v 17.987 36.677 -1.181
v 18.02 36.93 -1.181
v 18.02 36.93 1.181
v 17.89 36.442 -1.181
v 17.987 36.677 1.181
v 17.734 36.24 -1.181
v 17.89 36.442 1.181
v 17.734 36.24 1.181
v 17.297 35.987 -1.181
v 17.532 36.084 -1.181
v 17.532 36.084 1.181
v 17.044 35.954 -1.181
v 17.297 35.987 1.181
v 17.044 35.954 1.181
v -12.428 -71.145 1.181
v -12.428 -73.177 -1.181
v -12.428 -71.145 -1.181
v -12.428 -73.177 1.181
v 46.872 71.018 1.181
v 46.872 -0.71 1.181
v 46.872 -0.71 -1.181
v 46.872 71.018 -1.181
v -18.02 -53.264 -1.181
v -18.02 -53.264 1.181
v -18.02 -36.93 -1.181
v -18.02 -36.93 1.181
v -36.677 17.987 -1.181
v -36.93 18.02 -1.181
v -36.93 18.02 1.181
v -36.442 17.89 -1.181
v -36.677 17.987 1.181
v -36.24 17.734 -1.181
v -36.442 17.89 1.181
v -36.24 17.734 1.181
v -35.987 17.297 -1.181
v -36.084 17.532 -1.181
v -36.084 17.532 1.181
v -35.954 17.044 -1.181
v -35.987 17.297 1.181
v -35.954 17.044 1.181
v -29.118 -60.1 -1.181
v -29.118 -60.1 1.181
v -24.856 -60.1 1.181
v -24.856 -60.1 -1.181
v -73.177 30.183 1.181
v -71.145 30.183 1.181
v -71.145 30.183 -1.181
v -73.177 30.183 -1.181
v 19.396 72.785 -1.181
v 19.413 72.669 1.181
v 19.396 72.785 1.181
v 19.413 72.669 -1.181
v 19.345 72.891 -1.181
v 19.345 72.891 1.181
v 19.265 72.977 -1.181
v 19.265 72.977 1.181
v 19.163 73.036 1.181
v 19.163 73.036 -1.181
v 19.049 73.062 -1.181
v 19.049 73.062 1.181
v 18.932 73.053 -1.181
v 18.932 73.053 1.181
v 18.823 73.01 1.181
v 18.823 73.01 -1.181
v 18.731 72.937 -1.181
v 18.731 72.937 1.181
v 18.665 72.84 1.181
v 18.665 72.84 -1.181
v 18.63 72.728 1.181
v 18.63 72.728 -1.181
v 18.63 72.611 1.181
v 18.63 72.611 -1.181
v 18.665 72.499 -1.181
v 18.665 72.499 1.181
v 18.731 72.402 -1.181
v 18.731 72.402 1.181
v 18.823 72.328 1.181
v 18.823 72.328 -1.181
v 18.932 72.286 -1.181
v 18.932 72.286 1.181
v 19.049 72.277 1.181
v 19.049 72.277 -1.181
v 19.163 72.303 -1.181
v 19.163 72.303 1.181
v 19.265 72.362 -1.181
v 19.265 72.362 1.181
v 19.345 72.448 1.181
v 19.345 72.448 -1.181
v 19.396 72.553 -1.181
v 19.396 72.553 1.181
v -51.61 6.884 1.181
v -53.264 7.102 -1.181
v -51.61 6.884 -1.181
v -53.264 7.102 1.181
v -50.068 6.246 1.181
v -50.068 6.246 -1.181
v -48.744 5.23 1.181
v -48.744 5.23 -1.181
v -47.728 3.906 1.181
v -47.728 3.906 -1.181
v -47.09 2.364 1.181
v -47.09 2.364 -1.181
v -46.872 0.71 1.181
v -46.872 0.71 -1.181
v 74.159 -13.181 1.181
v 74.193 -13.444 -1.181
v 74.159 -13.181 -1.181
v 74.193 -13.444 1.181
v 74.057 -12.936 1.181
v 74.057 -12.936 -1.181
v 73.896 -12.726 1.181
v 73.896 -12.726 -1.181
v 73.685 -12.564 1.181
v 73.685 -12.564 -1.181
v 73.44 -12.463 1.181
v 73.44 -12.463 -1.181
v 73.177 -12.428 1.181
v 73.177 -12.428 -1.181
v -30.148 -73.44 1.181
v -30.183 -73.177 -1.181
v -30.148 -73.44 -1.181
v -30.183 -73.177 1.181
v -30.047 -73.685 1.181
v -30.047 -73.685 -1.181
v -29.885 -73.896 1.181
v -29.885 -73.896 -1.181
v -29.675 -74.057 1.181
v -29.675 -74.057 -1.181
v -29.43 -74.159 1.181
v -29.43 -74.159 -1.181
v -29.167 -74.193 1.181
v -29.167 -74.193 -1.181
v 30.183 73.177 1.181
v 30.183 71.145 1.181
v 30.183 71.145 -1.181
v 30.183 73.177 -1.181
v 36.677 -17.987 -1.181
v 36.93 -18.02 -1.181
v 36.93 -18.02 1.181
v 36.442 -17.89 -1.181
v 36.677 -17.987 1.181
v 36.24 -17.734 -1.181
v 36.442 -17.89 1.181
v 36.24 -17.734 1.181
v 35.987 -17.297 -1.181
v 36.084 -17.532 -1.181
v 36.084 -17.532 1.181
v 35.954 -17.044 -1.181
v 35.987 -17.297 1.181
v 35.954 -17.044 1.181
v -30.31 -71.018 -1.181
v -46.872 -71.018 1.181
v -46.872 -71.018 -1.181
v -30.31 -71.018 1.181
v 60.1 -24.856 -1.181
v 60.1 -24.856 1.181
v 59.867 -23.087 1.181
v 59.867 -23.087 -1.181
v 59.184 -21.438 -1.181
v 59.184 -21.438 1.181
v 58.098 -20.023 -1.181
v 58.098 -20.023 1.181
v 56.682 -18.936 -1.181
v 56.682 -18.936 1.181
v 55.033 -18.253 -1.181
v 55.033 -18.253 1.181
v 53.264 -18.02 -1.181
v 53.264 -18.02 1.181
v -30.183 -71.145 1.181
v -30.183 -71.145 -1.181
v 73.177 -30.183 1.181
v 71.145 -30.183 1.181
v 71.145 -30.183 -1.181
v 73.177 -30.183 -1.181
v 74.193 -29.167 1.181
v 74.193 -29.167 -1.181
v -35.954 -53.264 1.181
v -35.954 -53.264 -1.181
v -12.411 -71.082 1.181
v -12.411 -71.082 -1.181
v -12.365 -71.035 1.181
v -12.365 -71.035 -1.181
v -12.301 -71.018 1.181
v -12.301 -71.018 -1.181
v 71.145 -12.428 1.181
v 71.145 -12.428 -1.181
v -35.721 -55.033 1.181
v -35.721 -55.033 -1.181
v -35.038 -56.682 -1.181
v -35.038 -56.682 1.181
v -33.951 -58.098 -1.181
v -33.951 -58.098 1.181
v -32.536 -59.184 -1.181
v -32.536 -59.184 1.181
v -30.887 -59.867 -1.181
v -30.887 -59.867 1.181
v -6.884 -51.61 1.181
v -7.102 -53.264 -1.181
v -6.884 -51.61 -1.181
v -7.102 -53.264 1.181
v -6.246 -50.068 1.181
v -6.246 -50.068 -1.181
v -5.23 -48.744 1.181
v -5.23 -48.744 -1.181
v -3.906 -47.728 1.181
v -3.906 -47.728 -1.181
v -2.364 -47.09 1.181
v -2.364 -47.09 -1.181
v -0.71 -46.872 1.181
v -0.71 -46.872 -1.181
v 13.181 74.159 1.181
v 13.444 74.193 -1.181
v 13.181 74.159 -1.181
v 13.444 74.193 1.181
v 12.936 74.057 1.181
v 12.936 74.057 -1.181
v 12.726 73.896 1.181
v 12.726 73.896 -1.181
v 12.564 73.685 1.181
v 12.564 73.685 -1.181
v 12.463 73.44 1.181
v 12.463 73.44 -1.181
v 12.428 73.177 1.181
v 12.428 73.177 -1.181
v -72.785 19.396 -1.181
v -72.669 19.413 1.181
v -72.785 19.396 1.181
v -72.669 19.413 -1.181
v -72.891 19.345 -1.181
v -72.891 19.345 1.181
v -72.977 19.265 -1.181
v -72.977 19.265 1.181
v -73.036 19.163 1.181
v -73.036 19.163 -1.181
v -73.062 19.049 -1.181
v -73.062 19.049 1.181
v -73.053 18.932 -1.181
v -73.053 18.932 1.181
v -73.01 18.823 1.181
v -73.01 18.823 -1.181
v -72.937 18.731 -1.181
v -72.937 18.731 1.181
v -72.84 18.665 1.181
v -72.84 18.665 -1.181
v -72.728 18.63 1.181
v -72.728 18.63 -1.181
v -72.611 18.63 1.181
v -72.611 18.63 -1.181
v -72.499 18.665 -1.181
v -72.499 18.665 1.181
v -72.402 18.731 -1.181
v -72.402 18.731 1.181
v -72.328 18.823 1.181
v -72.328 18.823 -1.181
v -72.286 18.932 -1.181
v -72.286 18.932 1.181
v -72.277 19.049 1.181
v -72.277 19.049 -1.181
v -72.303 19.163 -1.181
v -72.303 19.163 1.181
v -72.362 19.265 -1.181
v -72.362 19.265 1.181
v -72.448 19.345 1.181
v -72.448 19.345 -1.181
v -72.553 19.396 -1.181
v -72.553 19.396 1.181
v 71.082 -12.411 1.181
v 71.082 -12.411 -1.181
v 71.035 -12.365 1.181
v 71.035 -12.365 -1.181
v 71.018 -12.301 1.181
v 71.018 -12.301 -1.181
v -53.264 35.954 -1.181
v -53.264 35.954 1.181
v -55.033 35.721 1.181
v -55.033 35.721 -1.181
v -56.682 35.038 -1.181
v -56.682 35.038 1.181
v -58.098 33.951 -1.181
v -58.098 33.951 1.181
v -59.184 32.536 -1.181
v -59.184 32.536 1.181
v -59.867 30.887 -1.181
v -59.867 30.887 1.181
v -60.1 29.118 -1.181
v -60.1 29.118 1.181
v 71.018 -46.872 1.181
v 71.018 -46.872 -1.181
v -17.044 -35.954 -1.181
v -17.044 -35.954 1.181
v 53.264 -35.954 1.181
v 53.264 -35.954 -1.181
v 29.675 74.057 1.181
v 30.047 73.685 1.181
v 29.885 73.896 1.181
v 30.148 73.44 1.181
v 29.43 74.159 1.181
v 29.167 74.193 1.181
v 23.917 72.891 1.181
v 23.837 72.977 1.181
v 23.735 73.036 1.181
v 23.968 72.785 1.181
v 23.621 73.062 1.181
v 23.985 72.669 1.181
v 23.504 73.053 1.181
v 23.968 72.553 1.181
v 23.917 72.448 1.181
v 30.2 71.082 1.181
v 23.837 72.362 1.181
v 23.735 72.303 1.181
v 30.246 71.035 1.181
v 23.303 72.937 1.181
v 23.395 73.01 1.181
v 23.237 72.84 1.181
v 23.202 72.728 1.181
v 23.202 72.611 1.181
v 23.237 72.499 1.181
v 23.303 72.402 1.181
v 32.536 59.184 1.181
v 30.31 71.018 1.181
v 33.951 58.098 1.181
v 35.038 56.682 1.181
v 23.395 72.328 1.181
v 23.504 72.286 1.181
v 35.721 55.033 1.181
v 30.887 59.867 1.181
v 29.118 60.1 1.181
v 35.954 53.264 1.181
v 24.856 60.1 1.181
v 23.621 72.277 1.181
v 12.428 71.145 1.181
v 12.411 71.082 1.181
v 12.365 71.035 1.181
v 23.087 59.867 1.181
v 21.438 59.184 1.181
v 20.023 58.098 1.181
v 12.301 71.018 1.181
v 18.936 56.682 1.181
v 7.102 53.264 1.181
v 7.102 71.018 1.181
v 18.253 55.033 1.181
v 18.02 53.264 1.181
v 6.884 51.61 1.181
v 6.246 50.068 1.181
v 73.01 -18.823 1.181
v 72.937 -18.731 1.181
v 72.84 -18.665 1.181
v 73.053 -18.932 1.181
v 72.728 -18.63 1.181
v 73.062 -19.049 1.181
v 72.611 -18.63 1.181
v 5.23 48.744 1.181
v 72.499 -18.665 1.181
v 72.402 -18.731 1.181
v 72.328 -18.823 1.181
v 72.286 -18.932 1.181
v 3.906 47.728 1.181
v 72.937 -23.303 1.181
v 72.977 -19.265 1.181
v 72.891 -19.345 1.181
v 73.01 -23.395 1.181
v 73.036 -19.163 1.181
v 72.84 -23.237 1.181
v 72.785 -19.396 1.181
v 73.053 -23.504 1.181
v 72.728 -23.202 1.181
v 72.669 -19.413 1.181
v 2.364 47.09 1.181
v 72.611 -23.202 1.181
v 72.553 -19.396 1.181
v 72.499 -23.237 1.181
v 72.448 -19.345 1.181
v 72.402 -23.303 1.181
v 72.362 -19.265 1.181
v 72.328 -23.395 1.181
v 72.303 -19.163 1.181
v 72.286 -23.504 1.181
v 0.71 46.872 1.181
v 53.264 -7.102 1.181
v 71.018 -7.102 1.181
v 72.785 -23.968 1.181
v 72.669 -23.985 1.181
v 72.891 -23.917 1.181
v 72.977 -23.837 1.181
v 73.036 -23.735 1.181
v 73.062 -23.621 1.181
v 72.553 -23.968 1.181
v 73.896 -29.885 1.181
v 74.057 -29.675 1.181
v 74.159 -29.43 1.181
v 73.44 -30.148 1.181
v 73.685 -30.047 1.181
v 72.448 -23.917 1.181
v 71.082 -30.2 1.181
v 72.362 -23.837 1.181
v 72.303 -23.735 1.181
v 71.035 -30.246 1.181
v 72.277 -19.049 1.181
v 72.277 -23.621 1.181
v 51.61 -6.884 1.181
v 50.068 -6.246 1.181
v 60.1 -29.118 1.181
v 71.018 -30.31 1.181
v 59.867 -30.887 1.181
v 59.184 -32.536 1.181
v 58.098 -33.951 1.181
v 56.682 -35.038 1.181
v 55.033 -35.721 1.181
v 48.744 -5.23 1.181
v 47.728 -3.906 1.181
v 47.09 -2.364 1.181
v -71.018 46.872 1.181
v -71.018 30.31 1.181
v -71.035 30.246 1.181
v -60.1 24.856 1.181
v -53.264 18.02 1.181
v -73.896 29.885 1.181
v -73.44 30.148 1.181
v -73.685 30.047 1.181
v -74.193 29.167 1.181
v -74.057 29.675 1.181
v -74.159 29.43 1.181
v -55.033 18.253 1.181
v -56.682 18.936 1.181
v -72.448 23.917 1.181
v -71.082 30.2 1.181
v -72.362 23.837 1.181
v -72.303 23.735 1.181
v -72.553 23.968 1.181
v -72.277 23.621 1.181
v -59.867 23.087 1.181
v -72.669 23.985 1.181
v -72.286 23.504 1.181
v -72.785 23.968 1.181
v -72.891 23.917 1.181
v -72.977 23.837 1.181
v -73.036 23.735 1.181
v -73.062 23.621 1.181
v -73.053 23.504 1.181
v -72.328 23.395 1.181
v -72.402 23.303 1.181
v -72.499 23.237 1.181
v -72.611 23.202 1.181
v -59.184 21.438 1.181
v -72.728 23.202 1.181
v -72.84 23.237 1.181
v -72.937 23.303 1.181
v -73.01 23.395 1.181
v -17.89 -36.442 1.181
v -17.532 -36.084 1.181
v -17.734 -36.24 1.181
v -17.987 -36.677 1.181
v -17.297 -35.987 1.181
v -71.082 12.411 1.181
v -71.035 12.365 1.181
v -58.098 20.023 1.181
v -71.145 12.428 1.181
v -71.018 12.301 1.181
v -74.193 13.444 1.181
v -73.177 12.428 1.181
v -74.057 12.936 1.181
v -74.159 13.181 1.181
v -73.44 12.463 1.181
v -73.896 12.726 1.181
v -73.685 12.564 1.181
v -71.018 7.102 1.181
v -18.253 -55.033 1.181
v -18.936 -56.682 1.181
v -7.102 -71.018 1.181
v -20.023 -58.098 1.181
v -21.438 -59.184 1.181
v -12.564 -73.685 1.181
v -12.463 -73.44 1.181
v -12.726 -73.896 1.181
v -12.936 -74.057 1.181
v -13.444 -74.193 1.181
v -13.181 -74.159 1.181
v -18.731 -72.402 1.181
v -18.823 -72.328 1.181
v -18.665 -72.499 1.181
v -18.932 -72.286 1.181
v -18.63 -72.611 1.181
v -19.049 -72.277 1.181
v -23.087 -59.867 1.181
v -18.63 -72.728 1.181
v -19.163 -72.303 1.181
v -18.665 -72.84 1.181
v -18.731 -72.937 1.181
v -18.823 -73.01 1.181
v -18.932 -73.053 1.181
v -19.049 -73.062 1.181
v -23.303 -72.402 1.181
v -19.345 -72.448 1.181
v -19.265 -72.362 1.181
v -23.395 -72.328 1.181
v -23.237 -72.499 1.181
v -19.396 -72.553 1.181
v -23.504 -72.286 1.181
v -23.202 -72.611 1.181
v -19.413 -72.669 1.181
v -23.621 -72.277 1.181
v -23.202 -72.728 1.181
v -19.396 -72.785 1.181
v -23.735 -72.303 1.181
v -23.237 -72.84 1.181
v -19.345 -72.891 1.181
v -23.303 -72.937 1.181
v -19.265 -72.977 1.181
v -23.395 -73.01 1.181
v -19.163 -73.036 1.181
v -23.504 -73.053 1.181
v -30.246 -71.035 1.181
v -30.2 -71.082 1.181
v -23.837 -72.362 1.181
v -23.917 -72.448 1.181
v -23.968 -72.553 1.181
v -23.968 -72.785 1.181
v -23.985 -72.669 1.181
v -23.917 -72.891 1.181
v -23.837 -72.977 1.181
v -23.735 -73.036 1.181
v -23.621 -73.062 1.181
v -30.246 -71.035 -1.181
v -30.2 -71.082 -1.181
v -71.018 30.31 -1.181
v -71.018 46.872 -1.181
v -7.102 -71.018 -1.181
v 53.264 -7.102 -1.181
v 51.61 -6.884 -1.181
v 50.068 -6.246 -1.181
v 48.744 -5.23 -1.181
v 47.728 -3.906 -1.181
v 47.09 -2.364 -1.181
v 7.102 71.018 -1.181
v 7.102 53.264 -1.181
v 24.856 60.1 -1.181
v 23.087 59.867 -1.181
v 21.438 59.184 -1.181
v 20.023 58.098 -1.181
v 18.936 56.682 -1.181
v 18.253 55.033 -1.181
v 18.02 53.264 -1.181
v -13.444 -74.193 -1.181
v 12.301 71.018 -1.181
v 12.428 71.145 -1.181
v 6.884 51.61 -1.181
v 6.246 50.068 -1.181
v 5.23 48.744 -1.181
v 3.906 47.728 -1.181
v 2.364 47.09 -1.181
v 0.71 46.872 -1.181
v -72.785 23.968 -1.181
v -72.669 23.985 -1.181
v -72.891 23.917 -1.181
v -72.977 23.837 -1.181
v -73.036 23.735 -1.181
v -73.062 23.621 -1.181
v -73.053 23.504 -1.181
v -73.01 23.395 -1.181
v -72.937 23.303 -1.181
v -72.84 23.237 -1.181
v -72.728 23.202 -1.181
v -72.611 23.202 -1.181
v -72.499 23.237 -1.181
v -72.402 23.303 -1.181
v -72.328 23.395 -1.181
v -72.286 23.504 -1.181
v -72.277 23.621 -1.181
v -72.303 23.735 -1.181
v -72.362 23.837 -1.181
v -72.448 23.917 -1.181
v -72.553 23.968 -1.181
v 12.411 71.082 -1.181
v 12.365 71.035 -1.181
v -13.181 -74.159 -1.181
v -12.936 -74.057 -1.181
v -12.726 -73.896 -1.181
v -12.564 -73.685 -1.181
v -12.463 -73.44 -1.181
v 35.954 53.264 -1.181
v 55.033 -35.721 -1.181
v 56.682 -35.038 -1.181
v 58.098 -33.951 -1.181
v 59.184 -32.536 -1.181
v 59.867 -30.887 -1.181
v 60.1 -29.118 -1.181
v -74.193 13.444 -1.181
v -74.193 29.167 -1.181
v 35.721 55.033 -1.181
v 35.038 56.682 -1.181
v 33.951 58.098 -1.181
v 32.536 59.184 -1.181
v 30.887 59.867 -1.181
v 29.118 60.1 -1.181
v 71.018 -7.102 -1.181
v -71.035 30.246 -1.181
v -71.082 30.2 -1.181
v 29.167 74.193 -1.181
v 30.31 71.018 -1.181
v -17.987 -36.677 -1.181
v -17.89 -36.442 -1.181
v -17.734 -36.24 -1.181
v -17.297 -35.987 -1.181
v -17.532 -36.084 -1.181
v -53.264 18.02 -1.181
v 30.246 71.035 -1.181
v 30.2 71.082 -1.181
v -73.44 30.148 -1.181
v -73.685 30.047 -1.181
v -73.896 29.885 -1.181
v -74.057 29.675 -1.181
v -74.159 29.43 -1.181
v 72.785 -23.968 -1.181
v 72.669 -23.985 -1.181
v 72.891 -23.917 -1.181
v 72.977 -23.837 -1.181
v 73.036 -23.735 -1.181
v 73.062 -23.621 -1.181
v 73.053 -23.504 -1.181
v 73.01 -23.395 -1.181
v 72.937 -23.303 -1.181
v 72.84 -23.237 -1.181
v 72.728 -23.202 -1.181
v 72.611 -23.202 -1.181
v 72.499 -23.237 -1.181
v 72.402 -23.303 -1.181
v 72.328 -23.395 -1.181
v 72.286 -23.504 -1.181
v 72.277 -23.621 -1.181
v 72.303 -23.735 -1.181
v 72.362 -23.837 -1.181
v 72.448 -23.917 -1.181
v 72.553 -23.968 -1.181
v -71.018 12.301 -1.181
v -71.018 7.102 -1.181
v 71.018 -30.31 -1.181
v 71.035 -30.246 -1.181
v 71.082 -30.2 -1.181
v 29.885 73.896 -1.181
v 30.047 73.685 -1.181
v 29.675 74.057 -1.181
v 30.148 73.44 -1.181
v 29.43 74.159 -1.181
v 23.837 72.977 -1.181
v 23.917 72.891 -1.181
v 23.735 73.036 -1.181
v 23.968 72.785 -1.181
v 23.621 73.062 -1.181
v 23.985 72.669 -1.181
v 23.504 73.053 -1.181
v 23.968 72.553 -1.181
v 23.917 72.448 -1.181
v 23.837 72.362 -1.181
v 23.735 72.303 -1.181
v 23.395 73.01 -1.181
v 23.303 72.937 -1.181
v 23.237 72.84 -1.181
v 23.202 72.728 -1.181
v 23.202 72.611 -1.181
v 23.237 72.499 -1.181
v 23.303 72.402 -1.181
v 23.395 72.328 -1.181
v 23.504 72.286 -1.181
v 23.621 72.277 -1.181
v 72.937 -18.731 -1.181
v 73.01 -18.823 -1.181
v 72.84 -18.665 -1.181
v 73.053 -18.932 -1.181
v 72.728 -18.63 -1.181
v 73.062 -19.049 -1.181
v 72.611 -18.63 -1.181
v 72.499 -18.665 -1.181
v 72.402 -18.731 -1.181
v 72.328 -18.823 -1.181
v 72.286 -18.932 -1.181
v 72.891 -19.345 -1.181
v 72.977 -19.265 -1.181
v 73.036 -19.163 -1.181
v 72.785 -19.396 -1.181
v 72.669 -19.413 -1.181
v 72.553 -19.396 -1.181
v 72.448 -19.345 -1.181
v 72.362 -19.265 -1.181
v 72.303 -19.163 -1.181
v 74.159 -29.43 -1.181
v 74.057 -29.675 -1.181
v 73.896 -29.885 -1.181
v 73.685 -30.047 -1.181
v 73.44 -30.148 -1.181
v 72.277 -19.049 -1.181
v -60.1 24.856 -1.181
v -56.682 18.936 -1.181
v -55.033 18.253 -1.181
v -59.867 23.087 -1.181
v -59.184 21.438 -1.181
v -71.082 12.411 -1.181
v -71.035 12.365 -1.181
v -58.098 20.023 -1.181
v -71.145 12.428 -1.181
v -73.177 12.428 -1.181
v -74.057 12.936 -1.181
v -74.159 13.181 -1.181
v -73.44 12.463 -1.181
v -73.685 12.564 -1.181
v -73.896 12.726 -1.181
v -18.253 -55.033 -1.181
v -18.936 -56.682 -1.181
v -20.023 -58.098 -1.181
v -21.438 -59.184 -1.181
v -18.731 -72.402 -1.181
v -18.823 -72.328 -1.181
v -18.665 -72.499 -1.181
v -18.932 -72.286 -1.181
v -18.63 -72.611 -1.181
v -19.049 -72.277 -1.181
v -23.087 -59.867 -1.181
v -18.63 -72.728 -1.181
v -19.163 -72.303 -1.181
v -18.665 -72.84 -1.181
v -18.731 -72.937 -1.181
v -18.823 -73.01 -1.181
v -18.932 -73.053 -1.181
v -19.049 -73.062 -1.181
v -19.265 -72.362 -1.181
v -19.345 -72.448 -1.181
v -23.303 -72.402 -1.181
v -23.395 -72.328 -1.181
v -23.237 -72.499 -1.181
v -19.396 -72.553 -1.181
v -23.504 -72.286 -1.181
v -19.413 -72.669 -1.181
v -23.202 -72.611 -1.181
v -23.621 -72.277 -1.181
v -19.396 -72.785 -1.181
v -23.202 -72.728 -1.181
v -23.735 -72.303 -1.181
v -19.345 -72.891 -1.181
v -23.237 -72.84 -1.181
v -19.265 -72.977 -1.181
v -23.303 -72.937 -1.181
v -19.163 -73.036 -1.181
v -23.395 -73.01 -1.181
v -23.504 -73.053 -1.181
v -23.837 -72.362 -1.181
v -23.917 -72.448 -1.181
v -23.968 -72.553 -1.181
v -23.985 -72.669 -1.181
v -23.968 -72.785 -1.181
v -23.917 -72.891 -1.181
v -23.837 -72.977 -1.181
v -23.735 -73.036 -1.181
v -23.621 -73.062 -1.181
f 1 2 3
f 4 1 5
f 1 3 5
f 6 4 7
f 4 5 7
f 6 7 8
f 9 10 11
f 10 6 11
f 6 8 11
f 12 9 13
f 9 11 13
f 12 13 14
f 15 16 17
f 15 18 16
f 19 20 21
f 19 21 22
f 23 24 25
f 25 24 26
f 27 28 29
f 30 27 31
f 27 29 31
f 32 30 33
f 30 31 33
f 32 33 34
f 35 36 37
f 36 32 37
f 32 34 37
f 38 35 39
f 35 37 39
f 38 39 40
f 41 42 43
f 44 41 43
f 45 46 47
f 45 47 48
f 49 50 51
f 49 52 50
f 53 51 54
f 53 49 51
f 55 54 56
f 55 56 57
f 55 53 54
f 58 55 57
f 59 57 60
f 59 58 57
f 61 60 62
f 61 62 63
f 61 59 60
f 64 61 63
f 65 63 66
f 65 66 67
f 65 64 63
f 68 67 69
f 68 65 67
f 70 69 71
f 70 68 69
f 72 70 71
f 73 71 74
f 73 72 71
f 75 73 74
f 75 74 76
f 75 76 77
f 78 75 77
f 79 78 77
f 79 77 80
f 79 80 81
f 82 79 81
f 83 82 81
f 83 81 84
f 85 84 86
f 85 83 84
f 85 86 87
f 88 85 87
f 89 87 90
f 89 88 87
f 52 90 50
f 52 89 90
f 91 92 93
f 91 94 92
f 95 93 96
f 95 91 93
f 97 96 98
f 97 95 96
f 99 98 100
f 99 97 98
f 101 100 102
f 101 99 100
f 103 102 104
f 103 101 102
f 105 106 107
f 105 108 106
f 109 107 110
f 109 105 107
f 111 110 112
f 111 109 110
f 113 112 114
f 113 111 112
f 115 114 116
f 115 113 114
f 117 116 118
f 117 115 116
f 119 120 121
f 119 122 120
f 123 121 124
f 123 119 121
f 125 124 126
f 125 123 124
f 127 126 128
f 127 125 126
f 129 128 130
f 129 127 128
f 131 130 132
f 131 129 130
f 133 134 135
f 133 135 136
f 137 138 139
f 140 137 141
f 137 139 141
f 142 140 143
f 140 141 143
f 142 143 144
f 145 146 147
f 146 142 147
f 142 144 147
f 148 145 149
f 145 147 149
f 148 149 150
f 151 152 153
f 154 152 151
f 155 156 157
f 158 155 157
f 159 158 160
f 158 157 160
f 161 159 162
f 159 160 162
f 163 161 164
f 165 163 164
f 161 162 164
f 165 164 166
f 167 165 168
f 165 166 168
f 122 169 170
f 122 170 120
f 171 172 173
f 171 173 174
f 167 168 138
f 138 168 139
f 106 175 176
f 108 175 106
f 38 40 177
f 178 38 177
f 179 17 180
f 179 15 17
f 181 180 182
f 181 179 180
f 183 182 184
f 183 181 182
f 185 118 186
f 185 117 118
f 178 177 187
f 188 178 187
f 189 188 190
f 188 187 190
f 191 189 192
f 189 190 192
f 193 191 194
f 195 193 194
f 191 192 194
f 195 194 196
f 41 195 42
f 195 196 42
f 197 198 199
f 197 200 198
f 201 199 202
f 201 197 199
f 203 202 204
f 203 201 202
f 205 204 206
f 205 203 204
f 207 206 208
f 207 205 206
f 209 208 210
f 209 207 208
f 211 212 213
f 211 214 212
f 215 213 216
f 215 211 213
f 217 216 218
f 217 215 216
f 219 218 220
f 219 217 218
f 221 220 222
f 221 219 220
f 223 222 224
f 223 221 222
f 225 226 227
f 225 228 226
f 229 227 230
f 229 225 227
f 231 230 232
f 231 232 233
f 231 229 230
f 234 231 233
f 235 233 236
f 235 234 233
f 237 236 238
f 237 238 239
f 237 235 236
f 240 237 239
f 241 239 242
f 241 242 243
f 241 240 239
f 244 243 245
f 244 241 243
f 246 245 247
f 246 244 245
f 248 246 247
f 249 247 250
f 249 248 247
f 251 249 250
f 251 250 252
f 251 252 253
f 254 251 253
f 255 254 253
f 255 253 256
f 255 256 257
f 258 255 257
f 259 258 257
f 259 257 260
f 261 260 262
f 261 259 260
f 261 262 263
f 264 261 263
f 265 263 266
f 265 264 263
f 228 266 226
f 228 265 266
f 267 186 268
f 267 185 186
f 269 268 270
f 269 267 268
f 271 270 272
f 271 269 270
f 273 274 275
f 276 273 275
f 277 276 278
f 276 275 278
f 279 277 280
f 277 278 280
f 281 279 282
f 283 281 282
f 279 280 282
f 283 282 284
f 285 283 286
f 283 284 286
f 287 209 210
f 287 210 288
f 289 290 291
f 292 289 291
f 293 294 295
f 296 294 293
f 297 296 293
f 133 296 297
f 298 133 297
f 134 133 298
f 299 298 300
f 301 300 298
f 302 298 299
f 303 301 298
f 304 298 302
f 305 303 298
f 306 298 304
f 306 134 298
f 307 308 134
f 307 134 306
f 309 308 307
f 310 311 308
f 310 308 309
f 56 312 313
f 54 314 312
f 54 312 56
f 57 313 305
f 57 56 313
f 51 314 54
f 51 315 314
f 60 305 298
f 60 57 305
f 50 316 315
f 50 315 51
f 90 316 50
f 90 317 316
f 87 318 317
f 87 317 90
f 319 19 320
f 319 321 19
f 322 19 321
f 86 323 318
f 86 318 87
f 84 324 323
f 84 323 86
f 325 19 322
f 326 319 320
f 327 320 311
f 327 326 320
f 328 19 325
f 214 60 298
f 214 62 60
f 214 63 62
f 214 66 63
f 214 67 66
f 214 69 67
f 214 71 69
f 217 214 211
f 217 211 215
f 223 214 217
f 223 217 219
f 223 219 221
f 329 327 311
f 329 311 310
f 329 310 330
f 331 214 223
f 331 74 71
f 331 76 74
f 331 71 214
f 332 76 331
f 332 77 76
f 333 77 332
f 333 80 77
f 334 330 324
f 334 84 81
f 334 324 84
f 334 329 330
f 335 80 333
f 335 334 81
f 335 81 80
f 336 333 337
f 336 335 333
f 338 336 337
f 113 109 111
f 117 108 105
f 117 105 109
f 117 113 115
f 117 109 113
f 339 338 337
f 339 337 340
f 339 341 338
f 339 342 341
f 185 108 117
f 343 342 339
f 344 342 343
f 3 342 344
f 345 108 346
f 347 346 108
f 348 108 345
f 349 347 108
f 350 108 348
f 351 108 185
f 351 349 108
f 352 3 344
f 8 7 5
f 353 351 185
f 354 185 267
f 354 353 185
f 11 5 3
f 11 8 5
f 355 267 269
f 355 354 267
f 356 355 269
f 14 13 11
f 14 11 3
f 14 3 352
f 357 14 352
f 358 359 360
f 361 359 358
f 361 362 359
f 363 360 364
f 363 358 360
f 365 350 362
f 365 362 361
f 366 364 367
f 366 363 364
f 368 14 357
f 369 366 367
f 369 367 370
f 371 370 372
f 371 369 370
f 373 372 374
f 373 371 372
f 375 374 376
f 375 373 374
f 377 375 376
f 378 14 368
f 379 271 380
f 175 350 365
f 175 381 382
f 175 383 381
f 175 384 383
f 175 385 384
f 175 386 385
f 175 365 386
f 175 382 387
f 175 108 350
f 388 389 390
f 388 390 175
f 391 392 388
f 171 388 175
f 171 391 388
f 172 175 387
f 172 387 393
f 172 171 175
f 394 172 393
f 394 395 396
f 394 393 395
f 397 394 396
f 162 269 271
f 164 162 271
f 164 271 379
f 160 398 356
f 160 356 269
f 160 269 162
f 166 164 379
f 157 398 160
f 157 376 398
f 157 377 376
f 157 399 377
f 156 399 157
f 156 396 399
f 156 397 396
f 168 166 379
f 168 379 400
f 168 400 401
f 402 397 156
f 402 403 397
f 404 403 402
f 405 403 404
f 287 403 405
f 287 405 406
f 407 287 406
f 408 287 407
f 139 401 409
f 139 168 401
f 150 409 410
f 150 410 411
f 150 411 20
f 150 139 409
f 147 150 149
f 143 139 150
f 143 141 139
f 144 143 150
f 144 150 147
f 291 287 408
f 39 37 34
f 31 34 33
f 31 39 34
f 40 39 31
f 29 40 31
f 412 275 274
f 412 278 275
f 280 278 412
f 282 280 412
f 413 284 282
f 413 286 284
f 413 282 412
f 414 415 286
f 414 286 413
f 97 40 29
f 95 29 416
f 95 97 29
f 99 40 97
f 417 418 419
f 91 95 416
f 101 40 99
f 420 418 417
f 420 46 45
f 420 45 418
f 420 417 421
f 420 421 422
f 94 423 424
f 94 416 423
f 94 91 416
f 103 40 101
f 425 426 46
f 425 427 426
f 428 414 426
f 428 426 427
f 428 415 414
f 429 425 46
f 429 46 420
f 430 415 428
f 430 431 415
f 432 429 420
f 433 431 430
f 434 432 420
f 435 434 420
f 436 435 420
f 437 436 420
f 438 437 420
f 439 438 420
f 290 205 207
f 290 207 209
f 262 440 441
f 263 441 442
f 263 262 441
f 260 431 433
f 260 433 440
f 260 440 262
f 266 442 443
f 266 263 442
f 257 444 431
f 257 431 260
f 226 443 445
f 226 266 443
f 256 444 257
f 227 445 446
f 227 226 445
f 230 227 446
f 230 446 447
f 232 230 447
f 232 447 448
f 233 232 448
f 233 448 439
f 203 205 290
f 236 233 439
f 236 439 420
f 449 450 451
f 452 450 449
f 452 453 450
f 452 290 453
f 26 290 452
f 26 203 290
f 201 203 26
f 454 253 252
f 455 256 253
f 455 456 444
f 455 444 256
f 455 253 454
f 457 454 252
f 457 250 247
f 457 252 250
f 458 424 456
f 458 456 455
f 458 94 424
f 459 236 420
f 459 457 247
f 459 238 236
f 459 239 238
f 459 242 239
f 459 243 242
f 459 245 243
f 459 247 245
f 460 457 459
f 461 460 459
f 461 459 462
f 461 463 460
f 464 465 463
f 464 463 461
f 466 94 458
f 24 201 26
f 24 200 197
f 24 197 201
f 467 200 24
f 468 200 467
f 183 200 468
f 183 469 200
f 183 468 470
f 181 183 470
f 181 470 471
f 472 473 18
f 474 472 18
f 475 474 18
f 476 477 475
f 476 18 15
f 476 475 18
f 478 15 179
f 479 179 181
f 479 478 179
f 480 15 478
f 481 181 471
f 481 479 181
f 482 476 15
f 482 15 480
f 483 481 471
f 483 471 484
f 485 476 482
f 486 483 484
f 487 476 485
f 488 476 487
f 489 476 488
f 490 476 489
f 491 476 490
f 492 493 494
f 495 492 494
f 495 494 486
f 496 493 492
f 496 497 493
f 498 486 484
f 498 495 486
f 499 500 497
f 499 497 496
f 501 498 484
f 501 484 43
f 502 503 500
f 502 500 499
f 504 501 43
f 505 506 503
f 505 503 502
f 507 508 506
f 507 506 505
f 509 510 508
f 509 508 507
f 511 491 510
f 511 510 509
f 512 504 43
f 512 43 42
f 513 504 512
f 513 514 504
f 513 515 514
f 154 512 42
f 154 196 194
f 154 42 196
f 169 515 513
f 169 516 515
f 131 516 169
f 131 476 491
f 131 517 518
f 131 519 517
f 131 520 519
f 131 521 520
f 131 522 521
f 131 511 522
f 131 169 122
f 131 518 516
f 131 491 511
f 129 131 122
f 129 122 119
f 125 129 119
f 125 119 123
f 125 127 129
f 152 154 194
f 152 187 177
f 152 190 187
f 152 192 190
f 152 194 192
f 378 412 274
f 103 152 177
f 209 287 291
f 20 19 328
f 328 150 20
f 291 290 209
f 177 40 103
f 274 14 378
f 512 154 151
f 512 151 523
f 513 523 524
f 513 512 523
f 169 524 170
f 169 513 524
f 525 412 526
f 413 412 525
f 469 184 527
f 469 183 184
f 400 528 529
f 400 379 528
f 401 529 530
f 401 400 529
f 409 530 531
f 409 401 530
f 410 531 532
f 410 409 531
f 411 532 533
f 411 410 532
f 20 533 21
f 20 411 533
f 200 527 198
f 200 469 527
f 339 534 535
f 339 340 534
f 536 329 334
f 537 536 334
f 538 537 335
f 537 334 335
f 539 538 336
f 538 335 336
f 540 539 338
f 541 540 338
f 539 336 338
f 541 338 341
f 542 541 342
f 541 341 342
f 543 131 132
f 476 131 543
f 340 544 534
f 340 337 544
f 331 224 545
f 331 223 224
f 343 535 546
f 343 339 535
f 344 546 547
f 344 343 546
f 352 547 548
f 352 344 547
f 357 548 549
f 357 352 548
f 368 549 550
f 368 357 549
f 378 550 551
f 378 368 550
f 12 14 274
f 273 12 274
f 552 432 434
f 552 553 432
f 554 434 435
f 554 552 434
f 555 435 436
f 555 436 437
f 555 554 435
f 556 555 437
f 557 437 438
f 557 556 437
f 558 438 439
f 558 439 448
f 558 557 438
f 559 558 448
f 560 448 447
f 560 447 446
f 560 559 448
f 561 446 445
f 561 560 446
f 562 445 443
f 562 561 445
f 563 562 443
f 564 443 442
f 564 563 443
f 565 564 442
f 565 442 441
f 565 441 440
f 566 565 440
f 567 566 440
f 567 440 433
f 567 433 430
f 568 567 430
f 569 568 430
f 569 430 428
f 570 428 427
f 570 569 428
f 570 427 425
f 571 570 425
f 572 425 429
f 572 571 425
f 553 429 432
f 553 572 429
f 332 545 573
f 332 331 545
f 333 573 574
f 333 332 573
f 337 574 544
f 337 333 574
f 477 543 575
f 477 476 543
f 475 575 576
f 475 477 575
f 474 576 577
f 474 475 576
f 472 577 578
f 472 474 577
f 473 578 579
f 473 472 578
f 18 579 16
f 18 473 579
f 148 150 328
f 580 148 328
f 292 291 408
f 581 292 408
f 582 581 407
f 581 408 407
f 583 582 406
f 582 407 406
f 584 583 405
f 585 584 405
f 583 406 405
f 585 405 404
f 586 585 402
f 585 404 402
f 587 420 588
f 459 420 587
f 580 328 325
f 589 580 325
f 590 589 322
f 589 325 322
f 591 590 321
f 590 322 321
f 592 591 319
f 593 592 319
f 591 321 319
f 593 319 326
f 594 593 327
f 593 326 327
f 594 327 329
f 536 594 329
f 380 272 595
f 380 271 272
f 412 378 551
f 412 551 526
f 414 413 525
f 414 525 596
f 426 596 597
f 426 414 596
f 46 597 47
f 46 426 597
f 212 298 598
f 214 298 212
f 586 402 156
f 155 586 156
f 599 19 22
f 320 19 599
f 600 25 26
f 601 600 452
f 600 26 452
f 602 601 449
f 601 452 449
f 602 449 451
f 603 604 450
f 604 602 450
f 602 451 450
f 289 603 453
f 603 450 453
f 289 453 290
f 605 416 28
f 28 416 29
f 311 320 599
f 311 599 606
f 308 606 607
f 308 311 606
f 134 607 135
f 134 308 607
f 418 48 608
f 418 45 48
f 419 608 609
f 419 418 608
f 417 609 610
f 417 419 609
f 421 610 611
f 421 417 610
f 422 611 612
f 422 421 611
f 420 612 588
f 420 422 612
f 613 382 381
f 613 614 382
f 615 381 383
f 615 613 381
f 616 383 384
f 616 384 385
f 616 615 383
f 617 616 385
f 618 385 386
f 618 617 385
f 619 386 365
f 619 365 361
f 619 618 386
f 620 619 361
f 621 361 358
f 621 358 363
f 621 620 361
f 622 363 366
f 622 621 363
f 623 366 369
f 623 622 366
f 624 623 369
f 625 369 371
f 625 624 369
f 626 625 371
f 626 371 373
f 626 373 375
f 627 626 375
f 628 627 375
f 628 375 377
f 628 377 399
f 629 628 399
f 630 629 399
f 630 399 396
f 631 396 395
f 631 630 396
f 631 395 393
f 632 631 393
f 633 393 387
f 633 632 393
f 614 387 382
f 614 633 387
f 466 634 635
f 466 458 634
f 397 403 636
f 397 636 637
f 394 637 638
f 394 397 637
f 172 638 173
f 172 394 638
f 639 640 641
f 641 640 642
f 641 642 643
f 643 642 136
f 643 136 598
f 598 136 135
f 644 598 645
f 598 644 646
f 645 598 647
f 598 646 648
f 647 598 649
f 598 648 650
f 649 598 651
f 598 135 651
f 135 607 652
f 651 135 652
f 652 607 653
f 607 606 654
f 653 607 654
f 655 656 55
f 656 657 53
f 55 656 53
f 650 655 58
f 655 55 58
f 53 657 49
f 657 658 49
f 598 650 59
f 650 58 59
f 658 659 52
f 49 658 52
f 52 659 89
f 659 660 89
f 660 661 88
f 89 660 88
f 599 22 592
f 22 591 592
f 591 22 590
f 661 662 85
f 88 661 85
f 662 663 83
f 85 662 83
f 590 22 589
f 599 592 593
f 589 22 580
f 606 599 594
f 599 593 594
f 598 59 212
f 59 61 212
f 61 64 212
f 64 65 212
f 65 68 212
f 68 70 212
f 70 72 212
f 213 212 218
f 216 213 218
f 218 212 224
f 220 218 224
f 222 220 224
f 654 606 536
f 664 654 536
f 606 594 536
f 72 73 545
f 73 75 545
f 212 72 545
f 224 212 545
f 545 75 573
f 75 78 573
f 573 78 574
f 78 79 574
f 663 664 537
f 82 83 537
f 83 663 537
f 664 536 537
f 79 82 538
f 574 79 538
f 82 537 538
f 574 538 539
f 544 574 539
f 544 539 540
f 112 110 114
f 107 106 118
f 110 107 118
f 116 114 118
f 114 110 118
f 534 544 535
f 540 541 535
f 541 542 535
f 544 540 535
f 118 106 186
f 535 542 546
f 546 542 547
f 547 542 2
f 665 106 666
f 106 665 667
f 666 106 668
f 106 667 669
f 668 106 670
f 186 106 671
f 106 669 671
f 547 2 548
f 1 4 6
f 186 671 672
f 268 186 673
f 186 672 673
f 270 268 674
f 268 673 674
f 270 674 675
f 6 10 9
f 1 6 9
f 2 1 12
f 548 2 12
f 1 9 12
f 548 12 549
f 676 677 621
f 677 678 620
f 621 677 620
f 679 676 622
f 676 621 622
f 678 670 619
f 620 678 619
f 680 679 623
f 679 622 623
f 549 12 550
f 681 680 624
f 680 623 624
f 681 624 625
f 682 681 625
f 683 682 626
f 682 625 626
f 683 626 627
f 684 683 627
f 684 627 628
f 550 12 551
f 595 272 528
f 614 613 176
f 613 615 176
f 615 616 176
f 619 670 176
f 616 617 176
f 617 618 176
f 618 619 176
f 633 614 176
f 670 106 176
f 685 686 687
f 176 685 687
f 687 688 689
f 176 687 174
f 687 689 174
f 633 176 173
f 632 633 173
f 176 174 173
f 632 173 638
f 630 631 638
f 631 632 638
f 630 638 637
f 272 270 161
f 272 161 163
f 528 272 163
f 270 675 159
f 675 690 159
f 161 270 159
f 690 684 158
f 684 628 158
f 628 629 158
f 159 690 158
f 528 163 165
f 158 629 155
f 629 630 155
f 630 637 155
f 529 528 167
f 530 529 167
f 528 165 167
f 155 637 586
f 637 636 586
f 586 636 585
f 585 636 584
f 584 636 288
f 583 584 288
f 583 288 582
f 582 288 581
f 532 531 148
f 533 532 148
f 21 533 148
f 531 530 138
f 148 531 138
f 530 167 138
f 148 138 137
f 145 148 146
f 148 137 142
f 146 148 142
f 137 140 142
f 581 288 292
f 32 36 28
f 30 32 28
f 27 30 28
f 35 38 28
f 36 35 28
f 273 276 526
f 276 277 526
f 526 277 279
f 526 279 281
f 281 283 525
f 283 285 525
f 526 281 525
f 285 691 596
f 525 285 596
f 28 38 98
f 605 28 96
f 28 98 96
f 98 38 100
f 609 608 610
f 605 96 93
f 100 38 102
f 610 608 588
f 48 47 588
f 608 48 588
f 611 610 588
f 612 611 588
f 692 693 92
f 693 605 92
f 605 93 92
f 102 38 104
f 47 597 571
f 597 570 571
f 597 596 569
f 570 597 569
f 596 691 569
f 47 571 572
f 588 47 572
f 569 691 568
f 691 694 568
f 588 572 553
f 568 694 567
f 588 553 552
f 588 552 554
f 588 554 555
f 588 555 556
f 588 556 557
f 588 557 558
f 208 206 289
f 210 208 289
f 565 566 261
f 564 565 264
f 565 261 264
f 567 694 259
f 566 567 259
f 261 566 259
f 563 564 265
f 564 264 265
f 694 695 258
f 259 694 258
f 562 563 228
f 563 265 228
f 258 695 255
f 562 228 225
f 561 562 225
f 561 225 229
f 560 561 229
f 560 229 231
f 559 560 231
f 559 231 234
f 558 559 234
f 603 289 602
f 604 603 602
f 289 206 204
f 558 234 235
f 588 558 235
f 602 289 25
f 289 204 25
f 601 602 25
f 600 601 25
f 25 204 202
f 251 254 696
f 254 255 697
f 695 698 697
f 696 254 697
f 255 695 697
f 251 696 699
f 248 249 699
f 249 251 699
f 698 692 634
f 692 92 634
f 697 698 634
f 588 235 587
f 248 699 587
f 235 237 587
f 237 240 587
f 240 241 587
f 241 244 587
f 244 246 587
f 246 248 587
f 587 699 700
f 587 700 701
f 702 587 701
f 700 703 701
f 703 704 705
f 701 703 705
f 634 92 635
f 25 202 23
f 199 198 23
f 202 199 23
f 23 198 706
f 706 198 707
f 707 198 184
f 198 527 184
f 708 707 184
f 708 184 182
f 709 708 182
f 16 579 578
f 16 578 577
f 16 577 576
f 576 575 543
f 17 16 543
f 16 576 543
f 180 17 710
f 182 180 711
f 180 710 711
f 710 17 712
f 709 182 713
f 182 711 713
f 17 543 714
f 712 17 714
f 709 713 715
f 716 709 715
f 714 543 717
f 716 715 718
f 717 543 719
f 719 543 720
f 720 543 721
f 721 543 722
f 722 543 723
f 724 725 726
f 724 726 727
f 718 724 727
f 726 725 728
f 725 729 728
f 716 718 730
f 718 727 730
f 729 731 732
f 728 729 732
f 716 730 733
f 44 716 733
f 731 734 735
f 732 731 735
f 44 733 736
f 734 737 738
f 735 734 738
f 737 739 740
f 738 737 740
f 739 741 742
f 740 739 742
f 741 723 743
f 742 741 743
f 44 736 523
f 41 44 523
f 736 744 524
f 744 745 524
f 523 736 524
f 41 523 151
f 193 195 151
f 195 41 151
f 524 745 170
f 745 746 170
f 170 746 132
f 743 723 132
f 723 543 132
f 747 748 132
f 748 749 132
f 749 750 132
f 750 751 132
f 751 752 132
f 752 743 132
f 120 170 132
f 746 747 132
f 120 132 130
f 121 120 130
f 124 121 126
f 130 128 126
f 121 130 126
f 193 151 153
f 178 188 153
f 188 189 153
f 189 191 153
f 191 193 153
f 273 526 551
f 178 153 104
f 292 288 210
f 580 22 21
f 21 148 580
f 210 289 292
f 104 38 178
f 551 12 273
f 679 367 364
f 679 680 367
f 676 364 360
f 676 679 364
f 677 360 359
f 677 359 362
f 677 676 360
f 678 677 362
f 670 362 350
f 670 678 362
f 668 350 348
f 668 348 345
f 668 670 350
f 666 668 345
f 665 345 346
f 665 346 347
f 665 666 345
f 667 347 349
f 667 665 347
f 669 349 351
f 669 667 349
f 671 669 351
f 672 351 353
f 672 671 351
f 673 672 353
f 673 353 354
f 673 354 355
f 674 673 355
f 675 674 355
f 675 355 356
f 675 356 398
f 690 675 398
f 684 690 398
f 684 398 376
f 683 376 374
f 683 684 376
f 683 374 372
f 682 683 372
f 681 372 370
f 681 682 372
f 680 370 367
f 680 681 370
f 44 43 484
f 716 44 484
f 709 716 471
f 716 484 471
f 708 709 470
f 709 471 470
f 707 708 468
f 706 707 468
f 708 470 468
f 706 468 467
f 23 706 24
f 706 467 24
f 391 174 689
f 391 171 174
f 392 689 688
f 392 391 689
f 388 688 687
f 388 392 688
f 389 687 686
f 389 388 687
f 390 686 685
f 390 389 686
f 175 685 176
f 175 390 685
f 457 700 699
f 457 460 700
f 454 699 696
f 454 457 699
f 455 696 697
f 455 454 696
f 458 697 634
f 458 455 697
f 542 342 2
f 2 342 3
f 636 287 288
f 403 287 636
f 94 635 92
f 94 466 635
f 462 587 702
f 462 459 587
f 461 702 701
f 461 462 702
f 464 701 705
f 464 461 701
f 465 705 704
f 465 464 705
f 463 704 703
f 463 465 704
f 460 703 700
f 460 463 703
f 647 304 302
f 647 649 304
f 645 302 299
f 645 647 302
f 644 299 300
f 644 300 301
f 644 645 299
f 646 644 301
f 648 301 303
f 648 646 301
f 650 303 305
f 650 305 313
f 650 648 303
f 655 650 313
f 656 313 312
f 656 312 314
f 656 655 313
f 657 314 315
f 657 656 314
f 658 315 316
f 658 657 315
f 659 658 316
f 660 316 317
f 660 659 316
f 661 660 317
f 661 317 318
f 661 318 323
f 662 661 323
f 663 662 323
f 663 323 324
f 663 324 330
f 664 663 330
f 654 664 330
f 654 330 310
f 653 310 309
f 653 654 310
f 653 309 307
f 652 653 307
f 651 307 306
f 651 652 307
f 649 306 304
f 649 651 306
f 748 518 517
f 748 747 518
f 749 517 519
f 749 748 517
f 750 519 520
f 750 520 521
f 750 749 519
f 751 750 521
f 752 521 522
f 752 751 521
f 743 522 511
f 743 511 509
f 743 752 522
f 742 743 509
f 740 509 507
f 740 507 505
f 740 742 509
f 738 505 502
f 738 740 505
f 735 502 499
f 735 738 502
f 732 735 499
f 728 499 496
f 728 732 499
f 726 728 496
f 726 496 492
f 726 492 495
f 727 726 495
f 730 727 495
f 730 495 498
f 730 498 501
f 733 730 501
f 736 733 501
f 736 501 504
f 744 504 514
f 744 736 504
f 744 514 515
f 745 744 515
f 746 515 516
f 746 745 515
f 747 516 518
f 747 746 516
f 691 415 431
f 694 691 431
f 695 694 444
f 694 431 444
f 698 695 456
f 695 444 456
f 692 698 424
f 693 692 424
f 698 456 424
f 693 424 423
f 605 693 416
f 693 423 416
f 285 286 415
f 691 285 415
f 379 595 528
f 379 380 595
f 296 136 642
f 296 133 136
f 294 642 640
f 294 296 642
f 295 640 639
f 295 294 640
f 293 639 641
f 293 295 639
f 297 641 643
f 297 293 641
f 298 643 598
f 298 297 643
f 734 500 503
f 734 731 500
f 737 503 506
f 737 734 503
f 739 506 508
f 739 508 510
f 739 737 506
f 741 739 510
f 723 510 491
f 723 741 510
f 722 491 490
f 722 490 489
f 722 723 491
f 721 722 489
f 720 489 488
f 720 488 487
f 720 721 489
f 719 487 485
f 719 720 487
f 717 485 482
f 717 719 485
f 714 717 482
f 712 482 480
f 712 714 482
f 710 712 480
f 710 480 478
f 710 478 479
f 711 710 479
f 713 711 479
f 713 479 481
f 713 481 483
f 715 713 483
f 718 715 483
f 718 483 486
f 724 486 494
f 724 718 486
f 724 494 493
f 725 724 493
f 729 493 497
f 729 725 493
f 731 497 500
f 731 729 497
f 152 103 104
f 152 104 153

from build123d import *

# Parameters (mm, degrees)
SKETCH2_R          = 0.3937
EXTRUDE1_DEPTH     = 1.1811
CIRPATTERN1_COUNT  = 4
CUT_EXTRUDE1_DEPTH = 2.54


with BuildPart() as part:
    # Sketch2 → Extrude1 (new, symmetric)
    with BuildSketch(Plane.XY):
        with BuildLine():
            Line((-28.40736, 35.5092), (17.044416, 35.5092))
            ThreePointArc((17.044416, 35.5092), (18.048767845, 35.925216155), (18.464784, 36.929568))
            Line((18.464784, 36.929568), (18.464784, 53.2638))
            ThreePointArc((18.464784, 53.2638), (20.336856699, 57.783383301), (24.85644, 59.655456))
            Line((24.85644, 59.655456), (29.117544, 59.655456))
            ThreePointArc((29.117544, 59.655456), (33.637127301, 57.783383301), (35.5092, 53.2638))
            Line((35.5092, 53.2638), (35.5092, 14.20368))
            Line((35.5092, 14.20368), (46.872144, 14.20368))
            Line((46.872144, 14.20368), (46.872144, 71.0184))
            Line((46.872144, 71.0184), (30.30982, 71.0184))
            ThreePointArc((30.30982, 71.0184), (30.220017439, 71.055597439), (30.18282, 71.1454))
            Line((30.18282, 71.1454), (30.18282, 73.1774))
            ThreePointArc((30.18282, 73.1774), (29.88524049, 73.89582049), (29.16682, 74.1934))
            Line((29.16682, 74.1934), (13.44422, 74.1934))
            ThreePointArc((13.44422, 74.1934), (12.72579951, 73.89582049), (12.42822, 73.1774))
            Line((12.42822, 73.1774), (12.42822, 71.1454))
            ThreePointArc((12.42822, 71.1454), (12.391022561, 71.055597439), (12.30122, 71.0184))
            Line((12.30122, 71.0184), (7.10184, 71.0184))
            Line((7.10184, 71.0184), (7.10184, 53.2638))
            ThreePointArc((7.10184, 53.2638), (5.229767301, 48.744216699), (0.710184, 46.872144))
            Line((0.710184, 46.872144), (-28.40736, 46.872144))
            Line((-28.40736, 46.872144), (-28.40736, 35.5092))
        make_face()
        with Locations((19.01952, 72.6694)):
            Circle(SKETCH2_R, mode=Mode.SUBTRACT)
        with Locations((23.59152, 72.6694)):
            Circle(SKETCH2_R, mode=Mode.SUBTRACT)
    extrude1 = extrude(amount=EXTRUDE1_DEPTH, both=True)

    # CirPattern1: Extrude1 ×4 about axis
    cirpattern1_axis = Axis((0, 0, -69.733664692), (0, 0, 1))
    for i in range(1, CIRPATTERN1_COUNT):
        add(extrude1.rotate(cirpattern1_axis, i * 360 / CIRPATTERN1_COUNT))

    # Sketch3 → Cut-Extrude1 (cut)
    with BuildSketch(Plane.XY.offset(1.1811)):
        with BuildLine():
            Line((29.117544, 60.099956), (24.85644, 60.099956))
            ThreePointArc((24.85644, 60.099956), (20.022547735, 58.097692265), (18.020284, 53.2638))
            Line((18.020284, 53.2638), (18.020284, 36.929568))
            ThreePointArc((18.020284, 36.929568), (17.73445888, 36.23952512), (17.044416, 35.9537))
            Line((17.044416, 35.9537), (-53.2638, 35.9537))
            ThreePointArc((-53.2638, 35.9537), (-58.097692265, 33.951436265), (-60.099956, 29.117544))
            Line((-60.099956, 29.117544), (-60.099956, 24.85644))
            ThreePointArc((-60.099956, 24.85644), (-58.097692265, 20.022547735), (-53.2638, 18.020284))
            Line((-53.2638, 18.020284), (-36.929568, 18.020284))
            ThreePointArc((-36.929568, 18.020284), (-36.23952512, 17.73445888), (-35.9537, 17.044416))
            Line((-35.9537, 17.044416), (-35.9537, -53.2638))
            ThreePointArc((-35.9537, -53.2638), (-33.951436265, -58.097692265), (-29.117544, -60.099956))
            Line((-29.117544, -60.099956), (-24.85644, -60.099956))
            ThreePointArc((-24.85644, -60.099956), (-20.022547735, -58.097692265), (-18.020284, -53.2638))
            Line((-18.020284, -53.2638), (-18.020284, -36.929568))
            ThreePointArc((-18.020284, -36.929568), (-17.73445888, -36.23952512), (-17.044416, -35.9537))
            Line((-17.044416, -35.9537), (53.2638, -35.9537))
            ThreePointArc((53.2638, -35.9537), (58.097692265, -33.951436265), (60.099956, -29.117544))
            Line((60.099956, -29.117544), (60.099956, -24.85644))
            ThreePointArc((60.099956, -24.85644), (58.097692265, -20.022547735), (53.2638, -18.020284))
            Line((53.2638, -18.020284), (36.929568, -18.020284))
            ThreePointArc((36.929568, -18.020284), (36.23952512, -17.73445888), (35.9537, -17.044416))
            Line((35.9537, -17.044416), (35.9537, 53.2638))
            ThreePointArc((35.9537, 53.2638), (33.951436265, 58.097692265), (29.117544, 60.099956))
        make_face()
    extrude(amount=-CUT_EXTRUDE1_DEPTH, mode=Mode.SUBTRACT)


solid = part.part
